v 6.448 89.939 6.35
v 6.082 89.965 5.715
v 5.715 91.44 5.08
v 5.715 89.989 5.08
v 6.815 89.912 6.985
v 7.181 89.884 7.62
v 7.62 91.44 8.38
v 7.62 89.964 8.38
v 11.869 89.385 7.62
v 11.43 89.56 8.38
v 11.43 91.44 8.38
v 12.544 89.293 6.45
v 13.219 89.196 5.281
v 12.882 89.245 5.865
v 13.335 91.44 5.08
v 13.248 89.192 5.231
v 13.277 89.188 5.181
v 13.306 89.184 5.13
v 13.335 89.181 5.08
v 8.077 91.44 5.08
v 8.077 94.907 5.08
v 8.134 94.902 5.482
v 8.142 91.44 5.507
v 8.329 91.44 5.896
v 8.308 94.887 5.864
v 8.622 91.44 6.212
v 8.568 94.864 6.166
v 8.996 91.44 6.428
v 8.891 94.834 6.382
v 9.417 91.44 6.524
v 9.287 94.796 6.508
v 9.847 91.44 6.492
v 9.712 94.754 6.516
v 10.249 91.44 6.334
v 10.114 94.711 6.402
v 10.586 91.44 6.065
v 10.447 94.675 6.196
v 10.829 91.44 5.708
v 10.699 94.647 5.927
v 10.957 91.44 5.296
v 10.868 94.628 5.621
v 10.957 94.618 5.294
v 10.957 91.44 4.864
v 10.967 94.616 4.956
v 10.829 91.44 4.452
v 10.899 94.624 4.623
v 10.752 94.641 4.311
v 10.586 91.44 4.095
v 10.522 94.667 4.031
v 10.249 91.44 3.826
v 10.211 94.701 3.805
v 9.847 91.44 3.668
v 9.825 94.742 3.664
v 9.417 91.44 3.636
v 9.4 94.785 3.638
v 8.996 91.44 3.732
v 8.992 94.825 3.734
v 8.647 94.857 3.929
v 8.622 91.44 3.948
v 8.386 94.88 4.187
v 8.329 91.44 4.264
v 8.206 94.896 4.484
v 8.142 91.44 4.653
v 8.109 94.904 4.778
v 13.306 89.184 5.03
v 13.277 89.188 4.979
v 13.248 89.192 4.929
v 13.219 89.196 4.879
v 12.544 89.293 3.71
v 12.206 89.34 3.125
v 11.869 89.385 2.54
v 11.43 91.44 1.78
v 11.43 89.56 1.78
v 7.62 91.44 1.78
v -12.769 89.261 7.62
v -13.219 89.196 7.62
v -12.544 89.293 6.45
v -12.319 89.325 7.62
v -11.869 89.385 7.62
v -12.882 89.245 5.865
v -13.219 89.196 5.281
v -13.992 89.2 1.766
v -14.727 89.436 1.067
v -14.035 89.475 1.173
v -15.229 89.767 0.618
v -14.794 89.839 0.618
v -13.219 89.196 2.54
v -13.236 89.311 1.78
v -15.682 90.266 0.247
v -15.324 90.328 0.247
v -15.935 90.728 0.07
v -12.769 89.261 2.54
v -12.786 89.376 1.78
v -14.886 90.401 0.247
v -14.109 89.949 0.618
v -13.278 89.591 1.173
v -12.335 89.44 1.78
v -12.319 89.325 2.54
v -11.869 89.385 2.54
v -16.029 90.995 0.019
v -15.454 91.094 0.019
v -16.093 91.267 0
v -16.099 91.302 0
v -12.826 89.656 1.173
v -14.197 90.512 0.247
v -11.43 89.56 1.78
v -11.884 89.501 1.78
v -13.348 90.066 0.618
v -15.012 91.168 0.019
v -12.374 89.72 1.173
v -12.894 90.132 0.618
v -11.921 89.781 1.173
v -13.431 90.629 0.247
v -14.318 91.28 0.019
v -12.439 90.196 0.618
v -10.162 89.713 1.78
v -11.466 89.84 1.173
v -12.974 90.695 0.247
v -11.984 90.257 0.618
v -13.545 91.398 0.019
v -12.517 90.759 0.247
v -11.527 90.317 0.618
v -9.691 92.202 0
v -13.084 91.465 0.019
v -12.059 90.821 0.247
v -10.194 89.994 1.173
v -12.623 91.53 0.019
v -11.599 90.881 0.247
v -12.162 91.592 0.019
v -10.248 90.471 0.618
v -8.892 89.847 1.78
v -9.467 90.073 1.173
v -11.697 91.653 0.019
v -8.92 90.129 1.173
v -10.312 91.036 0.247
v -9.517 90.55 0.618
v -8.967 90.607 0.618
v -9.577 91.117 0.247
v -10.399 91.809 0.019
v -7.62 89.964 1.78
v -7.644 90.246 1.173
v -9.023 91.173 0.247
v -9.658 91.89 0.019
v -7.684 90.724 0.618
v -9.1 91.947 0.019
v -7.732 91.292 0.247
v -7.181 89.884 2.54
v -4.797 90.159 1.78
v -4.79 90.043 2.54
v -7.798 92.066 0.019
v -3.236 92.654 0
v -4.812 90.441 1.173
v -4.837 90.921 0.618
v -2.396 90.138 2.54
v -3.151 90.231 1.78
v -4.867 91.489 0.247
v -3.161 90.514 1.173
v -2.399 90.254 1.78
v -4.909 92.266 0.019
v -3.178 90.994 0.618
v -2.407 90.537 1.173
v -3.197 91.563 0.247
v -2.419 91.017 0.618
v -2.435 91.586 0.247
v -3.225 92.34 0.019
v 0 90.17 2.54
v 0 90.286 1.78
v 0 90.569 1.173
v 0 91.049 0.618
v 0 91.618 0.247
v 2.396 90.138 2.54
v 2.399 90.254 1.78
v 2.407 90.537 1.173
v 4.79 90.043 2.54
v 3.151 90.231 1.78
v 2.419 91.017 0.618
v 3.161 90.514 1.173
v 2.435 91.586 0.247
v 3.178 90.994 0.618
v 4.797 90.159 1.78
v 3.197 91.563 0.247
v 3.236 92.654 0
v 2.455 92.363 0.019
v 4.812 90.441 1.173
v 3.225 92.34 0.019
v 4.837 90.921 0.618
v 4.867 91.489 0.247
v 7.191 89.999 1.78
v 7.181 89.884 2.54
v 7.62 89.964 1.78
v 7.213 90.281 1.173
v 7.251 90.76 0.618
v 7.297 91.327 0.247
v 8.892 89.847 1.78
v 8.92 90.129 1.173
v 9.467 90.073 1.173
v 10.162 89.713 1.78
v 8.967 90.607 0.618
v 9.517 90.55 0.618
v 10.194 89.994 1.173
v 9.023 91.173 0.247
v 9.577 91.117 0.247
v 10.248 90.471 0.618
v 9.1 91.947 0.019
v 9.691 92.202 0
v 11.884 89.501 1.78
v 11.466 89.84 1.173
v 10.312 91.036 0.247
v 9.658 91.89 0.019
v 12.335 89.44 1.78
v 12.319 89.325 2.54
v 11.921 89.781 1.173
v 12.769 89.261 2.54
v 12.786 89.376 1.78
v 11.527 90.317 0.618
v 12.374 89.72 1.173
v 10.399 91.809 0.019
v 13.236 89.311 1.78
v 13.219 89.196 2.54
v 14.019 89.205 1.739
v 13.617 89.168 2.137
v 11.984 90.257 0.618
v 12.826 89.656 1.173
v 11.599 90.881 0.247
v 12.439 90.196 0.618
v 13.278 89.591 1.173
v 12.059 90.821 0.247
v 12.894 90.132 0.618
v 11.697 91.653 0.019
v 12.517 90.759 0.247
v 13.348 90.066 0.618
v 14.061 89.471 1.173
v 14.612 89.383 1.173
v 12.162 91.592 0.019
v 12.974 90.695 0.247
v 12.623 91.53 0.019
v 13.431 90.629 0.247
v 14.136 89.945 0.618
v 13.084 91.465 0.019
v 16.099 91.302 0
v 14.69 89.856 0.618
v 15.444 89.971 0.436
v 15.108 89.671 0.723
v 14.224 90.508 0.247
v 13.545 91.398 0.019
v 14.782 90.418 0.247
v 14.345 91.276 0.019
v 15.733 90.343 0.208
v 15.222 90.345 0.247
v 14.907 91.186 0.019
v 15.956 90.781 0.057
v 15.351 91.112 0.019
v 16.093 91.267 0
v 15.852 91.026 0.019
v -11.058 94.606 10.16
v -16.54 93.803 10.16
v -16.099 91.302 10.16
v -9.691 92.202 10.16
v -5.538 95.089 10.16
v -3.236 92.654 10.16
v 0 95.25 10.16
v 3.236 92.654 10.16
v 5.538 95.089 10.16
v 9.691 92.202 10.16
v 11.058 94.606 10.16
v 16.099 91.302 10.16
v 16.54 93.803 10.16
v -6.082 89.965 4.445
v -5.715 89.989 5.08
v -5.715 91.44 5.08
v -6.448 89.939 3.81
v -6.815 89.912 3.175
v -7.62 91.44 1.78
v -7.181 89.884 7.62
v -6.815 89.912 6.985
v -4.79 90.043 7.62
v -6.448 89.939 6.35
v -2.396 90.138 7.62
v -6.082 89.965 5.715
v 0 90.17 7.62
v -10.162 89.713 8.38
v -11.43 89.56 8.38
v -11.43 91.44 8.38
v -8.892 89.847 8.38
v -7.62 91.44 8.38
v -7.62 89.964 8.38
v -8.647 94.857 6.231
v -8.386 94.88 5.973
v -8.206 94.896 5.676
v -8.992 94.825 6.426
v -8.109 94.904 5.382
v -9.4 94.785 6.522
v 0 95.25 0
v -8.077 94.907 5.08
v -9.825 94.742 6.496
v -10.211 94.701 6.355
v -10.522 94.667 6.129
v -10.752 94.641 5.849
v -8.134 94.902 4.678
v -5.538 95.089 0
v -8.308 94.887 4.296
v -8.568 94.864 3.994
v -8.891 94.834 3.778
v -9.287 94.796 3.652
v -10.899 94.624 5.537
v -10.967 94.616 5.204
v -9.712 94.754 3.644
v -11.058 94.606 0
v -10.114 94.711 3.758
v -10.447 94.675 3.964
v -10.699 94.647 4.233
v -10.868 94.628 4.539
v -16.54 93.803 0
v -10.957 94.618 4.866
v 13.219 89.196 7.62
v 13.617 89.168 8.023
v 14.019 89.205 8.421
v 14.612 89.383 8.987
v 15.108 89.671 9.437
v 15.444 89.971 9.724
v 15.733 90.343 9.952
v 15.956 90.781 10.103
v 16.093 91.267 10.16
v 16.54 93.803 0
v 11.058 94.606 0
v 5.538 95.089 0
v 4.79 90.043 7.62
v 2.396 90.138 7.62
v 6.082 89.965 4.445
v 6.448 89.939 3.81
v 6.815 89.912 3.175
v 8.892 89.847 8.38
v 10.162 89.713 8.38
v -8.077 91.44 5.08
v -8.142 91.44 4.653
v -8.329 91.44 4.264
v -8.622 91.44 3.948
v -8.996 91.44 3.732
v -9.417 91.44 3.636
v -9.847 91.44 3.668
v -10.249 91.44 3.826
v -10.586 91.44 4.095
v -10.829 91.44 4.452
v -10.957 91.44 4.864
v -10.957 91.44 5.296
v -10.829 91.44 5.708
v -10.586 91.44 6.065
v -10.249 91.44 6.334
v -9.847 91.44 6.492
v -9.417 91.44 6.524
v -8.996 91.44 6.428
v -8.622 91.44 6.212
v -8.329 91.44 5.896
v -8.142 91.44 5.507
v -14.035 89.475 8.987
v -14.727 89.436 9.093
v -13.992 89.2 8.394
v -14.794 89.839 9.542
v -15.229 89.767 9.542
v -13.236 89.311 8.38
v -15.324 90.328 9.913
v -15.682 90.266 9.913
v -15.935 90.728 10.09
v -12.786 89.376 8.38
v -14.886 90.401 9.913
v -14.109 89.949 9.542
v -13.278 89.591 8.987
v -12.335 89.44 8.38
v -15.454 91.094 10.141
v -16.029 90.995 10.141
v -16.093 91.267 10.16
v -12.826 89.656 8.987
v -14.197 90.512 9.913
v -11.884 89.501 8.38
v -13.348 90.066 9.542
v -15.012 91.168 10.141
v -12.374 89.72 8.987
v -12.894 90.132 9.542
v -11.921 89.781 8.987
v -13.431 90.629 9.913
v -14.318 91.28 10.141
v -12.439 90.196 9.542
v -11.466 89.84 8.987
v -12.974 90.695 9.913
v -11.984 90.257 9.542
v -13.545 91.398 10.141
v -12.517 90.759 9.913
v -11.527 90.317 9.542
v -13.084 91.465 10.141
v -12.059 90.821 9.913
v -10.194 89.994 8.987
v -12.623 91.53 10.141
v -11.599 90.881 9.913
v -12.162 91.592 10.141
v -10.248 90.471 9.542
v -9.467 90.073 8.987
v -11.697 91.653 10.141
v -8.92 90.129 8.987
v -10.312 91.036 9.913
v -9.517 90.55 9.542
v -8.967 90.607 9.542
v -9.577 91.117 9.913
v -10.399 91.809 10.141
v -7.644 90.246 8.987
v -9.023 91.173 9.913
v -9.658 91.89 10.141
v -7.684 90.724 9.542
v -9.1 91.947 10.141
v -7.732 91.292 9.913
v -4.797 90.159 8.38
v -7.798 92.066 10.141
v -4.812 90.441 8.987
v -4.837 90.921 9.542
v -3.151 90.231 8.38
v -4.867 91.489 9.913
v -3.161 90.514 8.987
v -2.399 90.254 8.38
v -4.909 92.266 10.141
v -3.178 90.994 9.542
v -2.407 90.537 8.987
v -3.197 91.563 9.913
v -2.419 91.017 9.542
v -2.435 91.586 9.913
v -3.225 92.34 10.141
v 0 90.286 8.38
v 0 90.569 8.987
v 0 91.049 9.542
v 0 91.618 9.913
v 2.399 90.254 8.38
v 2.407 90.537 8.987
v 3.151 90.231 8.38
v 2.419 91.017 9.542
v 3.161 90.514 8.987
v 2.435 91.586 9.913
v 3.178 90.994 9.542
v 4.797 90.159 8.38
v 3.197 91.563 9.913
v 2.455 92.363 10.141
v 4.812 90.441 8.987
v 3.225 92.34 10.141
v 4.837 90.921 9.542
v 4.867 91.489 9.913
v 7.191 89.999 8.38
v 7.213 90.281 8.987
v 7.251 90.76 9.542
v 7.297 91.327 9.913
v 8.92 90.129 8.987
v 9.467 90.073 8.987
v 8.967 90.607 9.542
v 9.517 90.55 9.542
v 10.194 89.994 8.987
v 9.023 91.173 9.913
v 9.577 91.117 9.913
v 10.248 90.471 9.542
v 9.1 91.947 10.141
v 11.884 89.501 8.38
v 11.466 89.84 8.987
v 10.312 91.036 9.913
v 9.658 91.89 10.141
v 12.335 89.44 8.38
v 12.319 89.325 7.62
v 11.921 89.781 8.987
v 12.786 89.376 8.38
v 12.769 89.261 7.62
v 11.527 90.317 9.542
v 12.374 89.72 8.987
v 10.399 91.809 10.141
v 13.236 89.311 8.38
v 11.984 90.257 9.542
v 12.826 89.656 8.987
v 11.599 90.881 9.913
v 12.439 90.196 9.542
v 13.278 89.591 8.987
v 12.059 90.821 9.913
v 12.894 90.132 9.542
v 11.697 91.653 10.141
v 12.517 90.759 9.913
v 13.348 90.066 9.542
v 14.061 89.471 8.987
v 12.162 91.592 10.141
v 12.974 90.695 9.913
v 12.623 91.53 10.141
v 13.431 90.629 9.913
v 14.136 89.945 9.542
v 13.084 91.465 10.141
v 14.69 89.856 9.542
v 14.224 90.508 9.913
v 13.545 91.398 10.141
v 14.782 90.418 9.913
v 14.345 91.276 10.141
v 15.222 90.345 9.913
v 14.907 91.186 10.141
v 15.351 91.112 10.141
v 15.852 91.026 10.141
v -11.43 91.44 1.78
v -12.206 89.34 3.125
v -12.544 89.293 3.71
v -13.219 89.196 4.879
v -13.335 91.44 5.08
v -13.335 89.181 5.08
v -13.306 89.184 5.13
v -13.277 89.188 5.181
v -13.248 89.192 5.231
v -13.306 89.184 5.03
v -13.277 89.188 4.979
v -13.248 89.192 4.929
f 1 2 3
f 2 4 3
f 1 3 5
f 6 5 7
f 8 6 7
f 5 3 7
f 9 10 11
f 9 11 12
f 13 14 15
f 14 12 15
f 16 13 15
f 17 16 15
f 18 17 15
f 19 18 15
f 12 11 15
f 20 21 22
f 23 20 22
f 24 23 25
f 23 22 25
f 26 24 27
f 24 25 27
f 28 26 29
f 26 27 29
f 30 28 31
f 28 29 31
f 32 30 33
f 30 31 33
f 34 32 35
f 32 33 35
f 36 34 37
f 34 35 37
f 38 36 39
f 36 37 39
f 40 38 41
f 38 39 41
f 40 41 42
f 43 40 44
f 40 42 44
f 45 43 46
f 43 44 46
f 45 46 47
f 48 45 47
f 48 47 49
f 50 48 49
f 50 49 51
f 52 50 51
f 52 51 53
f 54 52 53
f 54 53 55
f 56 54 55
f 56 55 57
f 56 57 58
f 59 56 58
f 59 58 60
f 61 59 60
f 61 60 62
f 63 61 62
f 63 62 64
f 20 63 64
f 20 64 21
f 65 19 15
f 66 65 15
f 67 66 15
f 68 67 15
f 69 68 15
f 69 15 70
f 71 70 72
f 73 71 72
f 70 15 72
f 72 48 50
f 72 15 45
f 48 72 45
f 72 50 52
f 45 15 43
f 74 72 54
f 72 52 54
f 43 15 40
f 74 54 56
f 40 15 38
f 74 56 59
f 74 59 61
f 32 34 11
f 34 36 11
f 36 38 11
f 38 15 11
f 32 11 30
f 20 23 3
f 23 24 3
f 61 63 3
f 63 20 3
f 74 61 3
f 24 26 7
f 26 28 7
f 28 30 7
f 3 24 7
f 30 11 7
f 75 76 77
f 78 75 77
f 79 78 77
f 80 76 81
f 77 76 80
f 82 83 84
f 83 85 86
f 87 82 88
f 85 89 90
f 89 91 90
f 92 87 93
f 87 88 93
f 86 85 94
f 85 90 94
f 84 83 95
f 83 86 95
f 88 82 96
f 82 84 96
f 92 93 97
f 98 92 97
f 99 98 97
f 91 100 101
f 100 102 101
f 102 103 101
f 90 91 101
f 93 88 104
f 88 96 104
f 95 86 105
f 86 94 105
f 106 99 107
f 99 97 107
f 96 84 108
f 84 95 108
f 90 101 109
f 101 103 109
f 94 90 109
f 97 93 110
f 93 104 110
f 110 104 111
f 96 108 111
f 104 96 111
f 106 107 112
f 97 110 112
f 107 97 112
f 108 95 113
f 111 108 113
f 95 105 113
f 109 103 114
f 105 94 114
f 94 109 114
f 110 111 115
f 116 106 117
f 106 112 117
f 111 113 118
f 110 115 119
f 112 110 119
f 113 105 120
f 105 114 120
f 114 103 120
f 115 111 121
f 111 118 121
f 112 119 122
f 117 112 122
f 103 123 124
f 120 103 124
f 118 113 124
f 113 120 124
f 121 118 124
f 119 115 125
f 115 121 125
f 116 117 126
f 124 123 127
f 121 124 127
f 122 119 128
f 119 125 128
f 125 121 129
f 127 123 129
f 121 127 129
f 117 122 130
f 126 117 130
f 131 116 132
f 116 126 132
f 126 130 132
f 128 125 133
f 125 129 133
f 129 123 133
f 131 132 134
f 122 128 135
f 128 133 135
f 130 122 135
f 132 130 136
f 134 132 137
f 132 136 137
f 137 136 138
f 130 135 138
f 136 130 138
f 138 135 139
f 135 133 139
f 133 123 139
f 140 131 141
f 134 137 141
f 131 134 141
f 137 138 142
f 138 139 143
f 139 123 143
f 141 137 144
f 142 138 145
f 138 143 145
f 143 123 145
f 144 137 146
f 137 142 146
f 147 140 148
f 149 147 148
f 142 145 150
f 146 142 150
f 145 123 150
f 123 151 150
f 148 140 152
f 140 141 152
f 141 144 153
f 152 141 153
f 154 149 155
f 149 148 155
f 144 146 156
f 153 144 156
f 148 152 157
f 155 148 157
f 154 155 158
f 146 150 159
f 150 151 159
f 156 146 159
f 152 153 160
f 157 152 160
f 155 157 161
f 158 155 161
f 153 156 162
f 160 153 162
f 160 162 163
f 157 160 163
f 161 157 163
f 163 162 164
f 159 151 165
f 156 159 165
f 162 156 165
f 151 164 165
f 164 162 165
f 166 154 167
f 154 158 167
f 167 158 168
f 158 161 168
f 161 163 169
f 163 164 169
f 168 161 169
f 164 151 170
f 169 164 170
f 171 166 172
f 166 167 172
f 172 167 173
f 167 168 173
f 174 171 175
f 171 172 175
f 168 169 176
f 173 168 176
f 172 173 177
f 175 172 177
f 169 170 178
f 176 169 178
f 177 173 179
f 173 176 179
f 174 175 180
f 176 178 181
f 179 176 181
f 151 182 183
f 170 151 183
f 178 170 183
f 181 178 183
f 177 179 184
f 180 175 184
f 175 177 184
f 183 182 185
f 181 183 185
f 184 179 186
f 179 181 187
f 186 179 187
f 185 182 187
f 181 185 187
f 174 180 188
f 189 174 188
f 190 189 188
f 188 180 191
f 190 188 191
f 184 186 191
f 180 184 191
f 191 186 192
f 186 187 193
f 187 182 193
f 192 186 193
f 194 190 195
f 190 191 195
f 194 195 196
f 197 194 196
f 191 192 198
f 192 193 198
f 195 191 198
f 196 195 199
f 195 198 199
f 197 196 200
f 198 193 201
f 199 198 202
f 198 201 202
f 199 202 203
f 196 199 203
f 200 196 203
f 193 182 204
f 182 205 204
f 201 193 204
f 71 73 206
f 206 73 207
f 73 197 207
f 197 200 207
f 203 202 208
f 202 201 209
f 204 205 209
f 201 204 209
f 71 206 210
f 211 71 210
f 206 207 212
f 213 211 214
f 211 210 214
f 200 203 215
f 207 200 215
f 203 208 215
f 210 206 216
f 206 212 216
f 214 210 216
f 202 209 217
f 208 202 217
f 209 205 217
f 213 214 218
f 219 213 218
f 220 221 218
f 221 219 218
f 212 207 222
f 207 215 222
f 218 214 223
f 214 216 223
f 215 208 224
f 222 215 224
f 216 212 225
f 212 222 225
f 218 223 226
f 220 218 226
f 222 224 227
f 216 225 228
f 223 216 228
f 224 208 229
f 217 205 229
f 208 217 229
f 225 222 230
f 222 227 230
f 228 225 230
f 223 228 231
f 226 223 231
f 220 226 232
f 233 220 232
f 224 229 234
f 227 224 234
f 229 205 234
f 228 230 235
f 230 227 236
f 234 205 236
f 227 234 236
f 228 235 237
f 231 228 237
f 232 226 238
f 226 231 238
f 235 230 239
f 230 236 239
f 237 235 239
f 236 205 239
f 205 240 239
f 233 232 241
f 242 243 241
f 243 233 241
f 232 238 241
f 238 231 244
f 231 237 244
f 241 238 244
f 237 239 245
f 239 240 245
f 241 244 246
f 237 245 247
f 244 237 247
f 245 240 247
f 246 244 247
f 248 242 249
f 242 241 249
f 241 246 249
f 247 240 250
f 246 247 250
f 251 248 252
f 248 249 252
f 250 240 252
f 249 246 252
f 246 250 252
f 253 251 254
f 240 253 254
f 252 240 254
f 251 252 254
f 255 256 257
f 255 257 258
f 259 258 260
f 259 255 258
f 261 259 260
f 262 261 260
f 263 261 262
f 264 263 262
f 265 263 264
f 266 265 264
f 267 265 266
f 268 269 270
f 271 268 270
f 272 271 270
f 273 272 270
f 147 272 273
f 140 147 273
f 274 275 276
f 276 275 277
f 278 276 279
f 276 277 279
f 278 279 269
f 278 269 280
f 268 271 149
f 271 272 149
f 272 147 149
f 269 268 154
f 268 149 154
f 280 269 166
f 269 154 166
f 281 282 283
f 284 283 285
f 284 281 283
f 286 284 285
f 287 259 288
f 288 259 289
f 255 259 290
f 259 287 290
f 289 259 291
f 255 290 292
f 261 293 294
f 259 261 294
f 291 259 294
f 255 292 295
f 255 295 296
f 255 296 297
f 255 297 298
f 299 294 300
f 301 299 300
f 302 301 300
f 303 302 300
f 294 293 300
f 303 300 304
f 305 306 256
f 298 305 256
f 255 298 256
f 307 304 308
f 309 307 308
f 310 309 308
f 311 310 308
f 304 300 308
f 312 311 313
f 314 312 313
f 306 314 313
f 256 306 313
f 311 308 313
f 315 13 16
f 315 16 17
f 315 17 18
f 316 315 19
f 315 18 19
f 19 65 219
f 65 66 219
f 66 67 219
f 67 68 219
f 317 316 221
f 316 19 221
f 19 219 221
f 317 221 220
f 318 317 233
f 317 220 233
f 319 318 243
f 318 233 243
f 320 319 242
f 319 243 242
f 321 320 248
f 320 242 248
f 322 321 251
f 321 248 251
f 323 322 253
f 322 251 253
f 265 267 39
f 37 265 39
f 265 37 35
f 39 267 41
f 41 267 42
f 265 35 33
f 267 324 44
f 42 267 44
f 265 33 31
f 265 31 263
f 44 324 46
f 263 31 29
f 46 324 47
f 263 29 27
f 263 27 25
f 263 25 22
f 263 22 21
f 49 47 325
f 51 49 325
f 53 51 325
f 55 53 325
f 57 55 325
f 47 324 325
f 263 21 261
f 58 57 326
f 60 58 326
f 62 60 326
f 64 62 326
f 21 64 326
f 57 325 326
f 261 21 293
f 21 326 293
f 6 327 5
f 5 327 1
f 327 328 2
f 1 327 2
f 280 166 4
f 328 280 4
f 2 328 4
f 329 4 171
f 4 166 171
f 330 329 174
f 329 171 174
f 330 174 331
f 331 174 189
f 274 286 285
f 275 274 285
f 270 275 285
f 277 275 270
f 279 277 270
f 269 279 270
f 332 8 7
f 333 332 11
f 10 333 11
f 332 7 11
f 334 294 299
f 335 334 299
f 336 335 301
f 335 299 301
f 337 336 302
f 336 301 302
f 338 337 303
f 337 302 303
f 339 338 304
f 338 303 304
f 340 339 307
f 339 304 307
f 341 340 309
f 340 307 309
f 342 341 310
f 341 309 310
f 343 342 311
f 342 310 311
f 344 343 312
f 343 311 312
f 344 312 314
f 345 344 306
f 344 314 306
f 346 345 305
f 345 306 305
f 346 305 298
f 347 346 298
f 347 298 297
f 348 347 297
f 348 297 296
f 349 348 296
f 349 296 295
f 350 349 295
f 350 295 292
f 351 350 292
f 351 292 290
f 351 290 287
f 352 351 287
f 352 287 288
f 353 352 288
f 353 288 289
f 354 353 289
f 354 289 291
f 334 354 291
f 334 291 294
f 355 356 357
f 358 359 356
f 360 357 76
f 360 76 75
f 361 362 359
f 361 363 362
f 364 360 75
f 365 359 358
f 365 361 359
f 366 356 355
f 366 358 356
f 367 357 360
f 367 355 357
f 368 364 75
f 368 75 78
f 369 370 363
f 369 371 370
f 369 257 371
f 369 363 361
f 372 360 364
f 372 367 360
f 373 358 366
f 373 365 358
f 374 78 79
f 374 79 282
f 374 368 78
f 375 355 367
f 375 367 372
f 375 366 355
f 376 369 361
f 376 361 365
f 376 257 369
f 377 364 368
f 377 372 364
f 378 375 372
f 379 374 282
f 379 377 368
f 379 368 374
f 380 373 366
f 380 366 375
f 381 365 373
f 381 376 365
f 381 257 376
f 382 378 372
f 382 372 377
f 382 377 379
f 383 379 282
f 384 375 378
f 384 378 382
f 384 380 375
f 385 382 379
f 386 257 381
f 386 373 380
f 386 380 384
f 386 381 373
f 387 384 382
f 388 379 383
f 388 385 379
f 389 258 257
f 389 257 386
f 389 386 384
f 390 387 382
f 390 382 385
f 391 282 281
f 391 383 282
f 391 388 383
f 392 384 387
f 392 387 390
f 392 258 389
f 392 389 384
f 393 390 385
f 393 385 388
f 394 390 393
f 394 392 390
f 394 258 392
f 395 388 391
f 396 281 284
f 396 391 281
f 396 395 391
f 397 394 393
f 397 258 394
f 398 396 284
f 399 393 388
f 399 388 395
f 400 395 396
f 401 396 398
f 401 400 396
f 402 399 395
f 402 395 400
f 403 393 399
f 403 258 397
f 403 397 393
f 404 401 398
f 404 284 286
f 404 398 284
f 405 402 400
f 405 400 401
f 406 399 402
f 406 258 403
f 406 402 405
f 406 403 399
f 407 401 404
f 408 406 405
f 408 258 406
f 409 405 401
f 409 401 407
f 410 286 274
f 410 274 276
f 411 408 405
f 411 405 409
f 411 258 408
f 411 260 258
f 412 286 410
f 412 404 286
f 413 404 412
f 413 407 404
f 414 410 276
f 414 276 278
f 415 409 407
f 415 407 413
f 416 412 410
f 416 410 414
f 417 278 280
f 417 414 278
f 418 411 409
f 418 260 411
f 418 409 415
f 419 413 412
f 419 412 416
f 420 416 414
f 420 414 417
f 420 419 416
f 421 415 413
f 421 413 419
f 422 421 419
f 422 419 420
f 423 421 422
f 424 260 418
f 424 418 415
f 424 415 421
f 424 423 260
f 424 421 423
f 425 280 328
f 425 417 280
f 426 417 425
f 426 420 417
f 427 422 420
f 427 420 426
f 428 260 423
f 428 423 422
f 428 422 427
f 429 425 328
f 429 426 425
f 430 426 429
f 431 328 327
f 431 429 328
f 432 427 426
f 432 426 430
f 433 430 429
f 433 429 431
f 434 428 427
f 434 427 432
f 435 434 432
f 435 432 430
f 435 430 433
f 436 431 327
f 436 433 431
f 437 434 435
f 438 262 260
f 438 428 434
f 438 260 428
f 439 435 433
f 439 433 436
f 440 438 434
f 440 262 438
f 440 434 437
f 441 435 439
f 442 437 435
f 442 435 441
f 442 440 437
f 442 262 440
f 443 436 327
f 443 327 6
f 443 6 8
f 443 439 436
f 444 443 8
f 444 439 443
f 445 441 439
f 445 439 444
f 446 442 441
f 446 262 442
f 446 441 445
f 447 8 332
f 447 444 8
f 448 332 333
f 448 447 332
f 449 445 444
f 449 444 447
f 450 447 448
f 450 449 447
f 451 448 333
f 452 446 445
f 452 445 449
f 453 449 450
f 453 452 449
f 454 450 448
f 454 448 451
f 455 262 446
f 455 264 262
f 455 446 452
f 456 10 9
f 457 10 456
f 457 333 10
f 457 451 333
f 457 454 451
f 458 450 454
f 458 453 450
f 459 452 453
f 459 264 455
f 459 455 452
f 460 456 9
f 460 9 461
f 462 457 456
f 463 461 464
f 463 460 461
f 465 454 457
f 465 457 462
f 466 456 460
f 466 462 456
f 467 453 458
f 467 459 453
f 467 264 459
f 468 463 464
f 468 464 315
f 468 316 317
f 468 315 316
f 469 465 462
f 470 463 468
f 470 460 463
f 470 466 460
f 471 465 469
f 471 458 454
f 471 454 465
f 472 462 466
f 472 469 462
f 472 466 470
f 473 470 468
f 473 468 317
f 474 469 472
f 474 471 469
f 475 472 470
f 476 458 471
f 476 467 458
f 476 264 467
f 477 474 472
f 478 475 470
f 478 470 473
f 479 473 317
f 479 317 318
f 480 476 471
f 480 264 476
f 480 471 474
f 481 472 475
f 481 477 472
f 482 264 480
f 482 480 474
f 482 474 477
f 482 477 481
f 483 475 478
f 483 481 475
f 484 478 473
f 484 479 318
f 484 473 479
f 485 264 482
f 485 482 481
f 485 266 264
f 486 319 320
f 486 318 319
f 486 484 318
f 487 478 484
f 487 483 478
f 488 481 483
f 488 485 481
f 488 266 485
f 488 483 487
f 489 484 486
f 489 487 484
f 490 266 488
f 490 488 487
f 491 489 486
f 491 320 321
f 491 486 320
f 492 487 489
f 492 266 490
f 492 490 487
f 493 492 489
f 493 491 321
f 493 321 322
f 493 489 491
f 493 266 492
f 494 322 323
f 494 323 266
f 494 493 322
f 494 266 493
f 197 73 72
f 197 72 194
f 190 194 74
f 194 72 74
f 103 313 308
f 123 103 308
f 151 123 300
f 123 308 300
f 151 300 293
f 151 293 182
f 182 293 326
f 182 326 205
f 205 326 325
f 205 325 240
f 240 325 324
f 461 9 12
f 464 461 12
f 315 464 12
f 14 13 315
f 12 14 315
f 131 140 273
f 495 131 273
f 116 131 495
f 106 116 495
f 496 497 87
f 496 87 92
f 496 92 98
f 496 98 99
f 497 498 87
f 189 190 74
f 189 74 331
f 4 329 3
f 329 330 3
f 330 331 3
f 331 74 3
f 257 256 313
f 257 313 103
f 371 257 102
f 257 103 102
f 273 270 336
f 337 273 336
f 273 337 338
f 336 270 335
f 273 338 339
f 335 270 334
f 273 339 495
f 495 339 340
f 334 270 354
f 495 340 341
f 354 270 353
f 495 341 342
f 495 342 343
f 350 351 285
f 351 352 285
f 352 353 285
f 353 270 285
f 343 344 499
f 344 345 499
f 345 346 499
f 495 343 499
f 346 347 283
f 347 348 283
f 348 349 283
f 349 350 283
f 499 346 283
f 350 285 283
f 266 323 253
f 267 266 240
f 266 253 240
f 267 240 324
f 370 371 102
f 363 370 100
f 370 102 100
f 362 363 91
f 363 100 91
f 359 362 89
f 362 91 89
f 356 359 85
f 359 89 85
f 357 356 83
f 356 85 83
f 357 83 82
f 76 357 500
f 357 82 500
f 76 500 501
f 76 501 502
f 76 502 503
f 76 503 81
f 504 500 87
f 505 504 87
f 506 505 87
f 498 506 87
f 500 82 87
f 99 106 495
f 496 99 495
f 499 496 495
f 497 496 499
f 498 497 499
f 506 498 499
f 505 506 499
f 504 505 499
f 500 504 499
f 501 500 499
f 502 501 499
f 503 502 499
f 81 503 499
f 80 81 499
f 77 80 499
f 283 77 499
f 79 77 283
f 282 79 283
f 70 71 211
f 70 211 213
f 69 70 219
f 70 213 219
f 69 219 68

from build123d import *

# Parameters (mm, degrees)
F1_DEPTH     = 10.16
F5_R         = 1.4478
F6_DEPTH     = 25.4
F10_DEPTH    = 1.27
F11_T1_DEPTH = 22.6859947386
F11_T4_ANGLE = 28.0699881424
F11_T6_ANGLE = 28.0699881424


# Not quite as in the source:
# - a fillet or chamfer that OpenCascade refuses, or shapes differently, is made with other operations: its cross-section is extruded or revolved along the edge and cut away or added


with BuildPart() as f1:
    # F0 (on Top) → F1 (new body)
    with BuildSketch(Plane.XY):
        with BuildLine():
            ThreePointArc((0, 95.25), (-8.3015844967, 94.8875449932), (-16.5399889228, 93.8029384744))
            Line((-16.5399889228, 93.8029384744), (-15.6578561802, 88.8001150891))
            ThreePointArc((-15.6578561802, 88.8001150891), (-7.8588333236, 89.8268759269), (0, 90.17))
            Line((0, 90.17), (0, 95.25))
        make_face()
        with BuildLine():
            Line((15.6578561802, 88.8001150891), (16.5399889228, 93.8029384744))
            ThreePointArc((16.5399889228, 93.8029384744), (8.3015844967, 94.8875449932), (0, 95.25))
            Line((0, 95.25), (0, 90.17))
            ThreePointArc((0, 90.17), (7.8588333236, 89.8268759269), (15.6578561802, 88.8001150891))
        make_face()
    extrude(amount=F1_DEPTH)

    # F5 (on line) → F6 (cut)
    with BuildSketch(Plane(origin=(0, 95.25, 0), x_dir=(-1, 0, 0), z_dir=(0, 1, 0))):
        with Locations((-9.525, 5.08)):
            Circle(F5_R)
        with BuildLine():
            ThreePointArc((10.9728, 5.08), (9.525, 6.5278), (8.0772, 5.08))
            ThreePointArc((8.0772, 5.08), (9.525, 3.6322), (10.9728, 5.08))
        make_face()
    extrude(amount=-F6_DEPTH, mode=Mode.SUBTRACT)

    # F9 (on line) → F10 (cut, symmetric)
    with BuildSketch(Plane(origin=(0, 90.17, 0), x_dir=(-1, 0, 0), z_dir=(0, 1, 0))):
        Polygon((7.62, 8.3795567884), (5.715, 5.08), (7.62, 1.7804432116), (11.43, 1.7804432116), (13.335, 5.08), (11.43, 8.3795567884), align=None)
        Polygon((-11.43, 8.3795567884), (-13.335, 5.08), (-11.43, 1.7804432116), (-7.62, 1.7804432116), (-5.715, 5.08), (-7.62, 8.3795567884), align=None)
    extrude(amount=F10_DEPTH, both=True, mode=Mode.SUBTRACT)

    # F11: fillet of radius 2.54 on 4 edges, made by hand

    # F11_s2 → F11_t1 (cut)
    with BuildSketch(Plane.XY.offset(-6.2629973693)):
        with BuildLine():
            ThreePointArc((13.2190987409, 89.1957640725), (15.0767198196, 89.6478290697), (16.0928794122, 91.2672544357))
            Line((16.0928794122, 91.2672544357), (15.6578561802, 88.8001150891))
            ThreePointArc((15.6578561802, 88.8001150891), (14.4398326136, 89.0062926657), (13.2190987409, 89.1957640725))
        make_face()
        with BuildLine():
            ThreePointArc((-16.0928794122, 91.2672544357), (-15.0767198196, 89.6478290697), (-13.2190987409, 89.1957640725))
            ThreePointArc((-13.2190987409, 89.1957640725), (-14.4398326136, 89.0062926657), (-15.6578561802, 88.8001150891))
            Line((-15.6578561802, 88.8001150891), (-16.0928794122, 91.2672544357))
        make_face()
    extrude(amount=F11_T1_DEPTH, mode=Mode.SUBTRACT)

    # F11_s3 → F11_t4 (revolve, cut)
    with BuildSketch(Plane(origin=(0, 0, 0), x_dir=(0, 0, 1), z_dir=(-0.9701477887, -0.24251447, 0))):
        with BuildLine():
            ThreePointArc((7.62, 90.17), (9.4160512242, 90.9139487758), (10.16, 92.71))
            Line((10.16, 92.71), (10.16, 90.17))
            Line((10.16, 90.17), (7.62, 90.17))
        make_face()
    revolve(axis=Axis((0, 0, 10.16), (0, 0, -1)), revolution_arc=F11_T4_ANGLE, mode=Mode.SUBTRACT)

    # F11_s5 → F11_t6 (revolve, cut)
    with BuildSketch(Plane(origin=(0, 0, 0), x_dir=(0, 0, 1), z_dir=(-0.9701477887, -0.24251447, 0))):
        with BuildLine():
            ThreePointArc((2.54, 90.17), (0.7439487758, 90.9139487758), (0, 92.71))
            Line((0, 92.71), (0, 90.17))
            Line((0, 90.17), (2.54, 90.17))
        make_face()
    revolve(axis=Axis((0, 0, 0), (0, 0, -1)), revolution_arc=F11_T6_ANGLE, mode=Mode.SUBTRACT)


solid = f1.part
